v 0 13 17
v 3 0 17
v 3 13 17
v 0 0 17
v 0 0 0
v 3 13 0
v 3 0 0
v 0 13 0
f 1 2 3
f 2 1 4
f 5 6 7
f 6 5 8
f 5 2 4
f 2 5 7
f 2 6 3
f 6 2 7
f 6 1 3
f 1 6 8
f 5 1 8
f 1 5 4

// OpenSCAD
// Generated by SolidPython 1.0.1 on 2020-07-29 00:46:54


cube(size = [3, 13, 17]);
/***********************************************
*********      SolidPython code:      **********
************************************************
 
# import packages: SolidPython
from solid import *
from solid.utils import *
from itertools import chain, combinations, permutations


class Resize:

    def __init__(self, scad_file):
        self.scad_file = scad_file
        #self.scad_file = import_scad(scad_file)
        # cone/cylinder param:
        self.r1 = 0
        self.r2 = 0
        self.h = 0
        # rectangular prism param:
        self.w = 0
        self.l = 0
        # ellipse param:
        self.r = 0

    # import OpenScad code (file name corresponds to shape)


    # classify shape + parameters
    def assign(self, param1, param2, param3):
        if self.scad_file == 'cone.scad':
            self.r1 = param1
            self.r2 = param2
            self.h = param3
        elif self.scad_file == 'cylinder.scad':
            self.r1 = param1
            self.r2 = param2
            self.h = param3
        elif self.scad_file == 'rectangularPrism.scad':
            self.h = param1
            self.l = param2
            self.w = param3
        else:
            self.r = param1
            self.h = param2

    # resize parameters
    def iterate(self):
        x = range(3, 20, 2)
        i = 1
        if self.scad_file == 'cone.scad':
            tempList = list(permutations(x, 2))
            for temp in tempList:
                param1 = temp[0]
                param2 = temp[1]
                filepath = 'produced_scad_files/' + 'cone' + str(param1) + '_' + str(param2) + '_' + '.scad'
                scad_render_to_file(cylinder(h=param1, r1=param2, r2=0), filepath)

        elif self.scad_file == 'cylinder.scad':
            tempList = list(permutations(x, 3))
            for temp in tempList:
                param1 = temp[0]
                param2 = temp[1]
                filepath = 'produced_scad_files/' + 'cylinder' + str(param1) + '_' + str(param2) + '_' + '.scad'
                scad_render_to_file(cylinder(h=param1, r1=param2, r2=param2), filepath)

        elif self.scad_file == 'rectangularPrism.scad':
            tempList = list(permutations(x, 3))
            for temp in tempList:
                param1 = temp[0]
                param2 = temp[1]
                param3 = temp[2]
                filepath = 'produced_scad_files/' + 'rectangularPrism' + str(param1) + '_' + str(param2) + '_' + str(
                    param3) + '.scad'
                scad_render_to_file(cube(size=(param1, param2, param3)), filepath)

        elif self.scad_file == 'ellipse.scad':
            tempList = list(permutations(x, 4))
            for temp in tempList:
                param1 = temp[0]
                param2 = temp[1]
                param3 = temp[2]
                param4 = temp[3]
                filepath = 'produced_scad_files/' + 'ellipse' + str(param1) + '_' + str(param2) + '_' + str(param3) + '_' + str(param4) + '.scad'
                scad_render_to_file(scale([param1, param2, param3])(sphere(r=param4)), filepath)

    def render_to_scadfile(self):
        scad_render_to_file(scad, 'example.scad') 
 
************************************************/
